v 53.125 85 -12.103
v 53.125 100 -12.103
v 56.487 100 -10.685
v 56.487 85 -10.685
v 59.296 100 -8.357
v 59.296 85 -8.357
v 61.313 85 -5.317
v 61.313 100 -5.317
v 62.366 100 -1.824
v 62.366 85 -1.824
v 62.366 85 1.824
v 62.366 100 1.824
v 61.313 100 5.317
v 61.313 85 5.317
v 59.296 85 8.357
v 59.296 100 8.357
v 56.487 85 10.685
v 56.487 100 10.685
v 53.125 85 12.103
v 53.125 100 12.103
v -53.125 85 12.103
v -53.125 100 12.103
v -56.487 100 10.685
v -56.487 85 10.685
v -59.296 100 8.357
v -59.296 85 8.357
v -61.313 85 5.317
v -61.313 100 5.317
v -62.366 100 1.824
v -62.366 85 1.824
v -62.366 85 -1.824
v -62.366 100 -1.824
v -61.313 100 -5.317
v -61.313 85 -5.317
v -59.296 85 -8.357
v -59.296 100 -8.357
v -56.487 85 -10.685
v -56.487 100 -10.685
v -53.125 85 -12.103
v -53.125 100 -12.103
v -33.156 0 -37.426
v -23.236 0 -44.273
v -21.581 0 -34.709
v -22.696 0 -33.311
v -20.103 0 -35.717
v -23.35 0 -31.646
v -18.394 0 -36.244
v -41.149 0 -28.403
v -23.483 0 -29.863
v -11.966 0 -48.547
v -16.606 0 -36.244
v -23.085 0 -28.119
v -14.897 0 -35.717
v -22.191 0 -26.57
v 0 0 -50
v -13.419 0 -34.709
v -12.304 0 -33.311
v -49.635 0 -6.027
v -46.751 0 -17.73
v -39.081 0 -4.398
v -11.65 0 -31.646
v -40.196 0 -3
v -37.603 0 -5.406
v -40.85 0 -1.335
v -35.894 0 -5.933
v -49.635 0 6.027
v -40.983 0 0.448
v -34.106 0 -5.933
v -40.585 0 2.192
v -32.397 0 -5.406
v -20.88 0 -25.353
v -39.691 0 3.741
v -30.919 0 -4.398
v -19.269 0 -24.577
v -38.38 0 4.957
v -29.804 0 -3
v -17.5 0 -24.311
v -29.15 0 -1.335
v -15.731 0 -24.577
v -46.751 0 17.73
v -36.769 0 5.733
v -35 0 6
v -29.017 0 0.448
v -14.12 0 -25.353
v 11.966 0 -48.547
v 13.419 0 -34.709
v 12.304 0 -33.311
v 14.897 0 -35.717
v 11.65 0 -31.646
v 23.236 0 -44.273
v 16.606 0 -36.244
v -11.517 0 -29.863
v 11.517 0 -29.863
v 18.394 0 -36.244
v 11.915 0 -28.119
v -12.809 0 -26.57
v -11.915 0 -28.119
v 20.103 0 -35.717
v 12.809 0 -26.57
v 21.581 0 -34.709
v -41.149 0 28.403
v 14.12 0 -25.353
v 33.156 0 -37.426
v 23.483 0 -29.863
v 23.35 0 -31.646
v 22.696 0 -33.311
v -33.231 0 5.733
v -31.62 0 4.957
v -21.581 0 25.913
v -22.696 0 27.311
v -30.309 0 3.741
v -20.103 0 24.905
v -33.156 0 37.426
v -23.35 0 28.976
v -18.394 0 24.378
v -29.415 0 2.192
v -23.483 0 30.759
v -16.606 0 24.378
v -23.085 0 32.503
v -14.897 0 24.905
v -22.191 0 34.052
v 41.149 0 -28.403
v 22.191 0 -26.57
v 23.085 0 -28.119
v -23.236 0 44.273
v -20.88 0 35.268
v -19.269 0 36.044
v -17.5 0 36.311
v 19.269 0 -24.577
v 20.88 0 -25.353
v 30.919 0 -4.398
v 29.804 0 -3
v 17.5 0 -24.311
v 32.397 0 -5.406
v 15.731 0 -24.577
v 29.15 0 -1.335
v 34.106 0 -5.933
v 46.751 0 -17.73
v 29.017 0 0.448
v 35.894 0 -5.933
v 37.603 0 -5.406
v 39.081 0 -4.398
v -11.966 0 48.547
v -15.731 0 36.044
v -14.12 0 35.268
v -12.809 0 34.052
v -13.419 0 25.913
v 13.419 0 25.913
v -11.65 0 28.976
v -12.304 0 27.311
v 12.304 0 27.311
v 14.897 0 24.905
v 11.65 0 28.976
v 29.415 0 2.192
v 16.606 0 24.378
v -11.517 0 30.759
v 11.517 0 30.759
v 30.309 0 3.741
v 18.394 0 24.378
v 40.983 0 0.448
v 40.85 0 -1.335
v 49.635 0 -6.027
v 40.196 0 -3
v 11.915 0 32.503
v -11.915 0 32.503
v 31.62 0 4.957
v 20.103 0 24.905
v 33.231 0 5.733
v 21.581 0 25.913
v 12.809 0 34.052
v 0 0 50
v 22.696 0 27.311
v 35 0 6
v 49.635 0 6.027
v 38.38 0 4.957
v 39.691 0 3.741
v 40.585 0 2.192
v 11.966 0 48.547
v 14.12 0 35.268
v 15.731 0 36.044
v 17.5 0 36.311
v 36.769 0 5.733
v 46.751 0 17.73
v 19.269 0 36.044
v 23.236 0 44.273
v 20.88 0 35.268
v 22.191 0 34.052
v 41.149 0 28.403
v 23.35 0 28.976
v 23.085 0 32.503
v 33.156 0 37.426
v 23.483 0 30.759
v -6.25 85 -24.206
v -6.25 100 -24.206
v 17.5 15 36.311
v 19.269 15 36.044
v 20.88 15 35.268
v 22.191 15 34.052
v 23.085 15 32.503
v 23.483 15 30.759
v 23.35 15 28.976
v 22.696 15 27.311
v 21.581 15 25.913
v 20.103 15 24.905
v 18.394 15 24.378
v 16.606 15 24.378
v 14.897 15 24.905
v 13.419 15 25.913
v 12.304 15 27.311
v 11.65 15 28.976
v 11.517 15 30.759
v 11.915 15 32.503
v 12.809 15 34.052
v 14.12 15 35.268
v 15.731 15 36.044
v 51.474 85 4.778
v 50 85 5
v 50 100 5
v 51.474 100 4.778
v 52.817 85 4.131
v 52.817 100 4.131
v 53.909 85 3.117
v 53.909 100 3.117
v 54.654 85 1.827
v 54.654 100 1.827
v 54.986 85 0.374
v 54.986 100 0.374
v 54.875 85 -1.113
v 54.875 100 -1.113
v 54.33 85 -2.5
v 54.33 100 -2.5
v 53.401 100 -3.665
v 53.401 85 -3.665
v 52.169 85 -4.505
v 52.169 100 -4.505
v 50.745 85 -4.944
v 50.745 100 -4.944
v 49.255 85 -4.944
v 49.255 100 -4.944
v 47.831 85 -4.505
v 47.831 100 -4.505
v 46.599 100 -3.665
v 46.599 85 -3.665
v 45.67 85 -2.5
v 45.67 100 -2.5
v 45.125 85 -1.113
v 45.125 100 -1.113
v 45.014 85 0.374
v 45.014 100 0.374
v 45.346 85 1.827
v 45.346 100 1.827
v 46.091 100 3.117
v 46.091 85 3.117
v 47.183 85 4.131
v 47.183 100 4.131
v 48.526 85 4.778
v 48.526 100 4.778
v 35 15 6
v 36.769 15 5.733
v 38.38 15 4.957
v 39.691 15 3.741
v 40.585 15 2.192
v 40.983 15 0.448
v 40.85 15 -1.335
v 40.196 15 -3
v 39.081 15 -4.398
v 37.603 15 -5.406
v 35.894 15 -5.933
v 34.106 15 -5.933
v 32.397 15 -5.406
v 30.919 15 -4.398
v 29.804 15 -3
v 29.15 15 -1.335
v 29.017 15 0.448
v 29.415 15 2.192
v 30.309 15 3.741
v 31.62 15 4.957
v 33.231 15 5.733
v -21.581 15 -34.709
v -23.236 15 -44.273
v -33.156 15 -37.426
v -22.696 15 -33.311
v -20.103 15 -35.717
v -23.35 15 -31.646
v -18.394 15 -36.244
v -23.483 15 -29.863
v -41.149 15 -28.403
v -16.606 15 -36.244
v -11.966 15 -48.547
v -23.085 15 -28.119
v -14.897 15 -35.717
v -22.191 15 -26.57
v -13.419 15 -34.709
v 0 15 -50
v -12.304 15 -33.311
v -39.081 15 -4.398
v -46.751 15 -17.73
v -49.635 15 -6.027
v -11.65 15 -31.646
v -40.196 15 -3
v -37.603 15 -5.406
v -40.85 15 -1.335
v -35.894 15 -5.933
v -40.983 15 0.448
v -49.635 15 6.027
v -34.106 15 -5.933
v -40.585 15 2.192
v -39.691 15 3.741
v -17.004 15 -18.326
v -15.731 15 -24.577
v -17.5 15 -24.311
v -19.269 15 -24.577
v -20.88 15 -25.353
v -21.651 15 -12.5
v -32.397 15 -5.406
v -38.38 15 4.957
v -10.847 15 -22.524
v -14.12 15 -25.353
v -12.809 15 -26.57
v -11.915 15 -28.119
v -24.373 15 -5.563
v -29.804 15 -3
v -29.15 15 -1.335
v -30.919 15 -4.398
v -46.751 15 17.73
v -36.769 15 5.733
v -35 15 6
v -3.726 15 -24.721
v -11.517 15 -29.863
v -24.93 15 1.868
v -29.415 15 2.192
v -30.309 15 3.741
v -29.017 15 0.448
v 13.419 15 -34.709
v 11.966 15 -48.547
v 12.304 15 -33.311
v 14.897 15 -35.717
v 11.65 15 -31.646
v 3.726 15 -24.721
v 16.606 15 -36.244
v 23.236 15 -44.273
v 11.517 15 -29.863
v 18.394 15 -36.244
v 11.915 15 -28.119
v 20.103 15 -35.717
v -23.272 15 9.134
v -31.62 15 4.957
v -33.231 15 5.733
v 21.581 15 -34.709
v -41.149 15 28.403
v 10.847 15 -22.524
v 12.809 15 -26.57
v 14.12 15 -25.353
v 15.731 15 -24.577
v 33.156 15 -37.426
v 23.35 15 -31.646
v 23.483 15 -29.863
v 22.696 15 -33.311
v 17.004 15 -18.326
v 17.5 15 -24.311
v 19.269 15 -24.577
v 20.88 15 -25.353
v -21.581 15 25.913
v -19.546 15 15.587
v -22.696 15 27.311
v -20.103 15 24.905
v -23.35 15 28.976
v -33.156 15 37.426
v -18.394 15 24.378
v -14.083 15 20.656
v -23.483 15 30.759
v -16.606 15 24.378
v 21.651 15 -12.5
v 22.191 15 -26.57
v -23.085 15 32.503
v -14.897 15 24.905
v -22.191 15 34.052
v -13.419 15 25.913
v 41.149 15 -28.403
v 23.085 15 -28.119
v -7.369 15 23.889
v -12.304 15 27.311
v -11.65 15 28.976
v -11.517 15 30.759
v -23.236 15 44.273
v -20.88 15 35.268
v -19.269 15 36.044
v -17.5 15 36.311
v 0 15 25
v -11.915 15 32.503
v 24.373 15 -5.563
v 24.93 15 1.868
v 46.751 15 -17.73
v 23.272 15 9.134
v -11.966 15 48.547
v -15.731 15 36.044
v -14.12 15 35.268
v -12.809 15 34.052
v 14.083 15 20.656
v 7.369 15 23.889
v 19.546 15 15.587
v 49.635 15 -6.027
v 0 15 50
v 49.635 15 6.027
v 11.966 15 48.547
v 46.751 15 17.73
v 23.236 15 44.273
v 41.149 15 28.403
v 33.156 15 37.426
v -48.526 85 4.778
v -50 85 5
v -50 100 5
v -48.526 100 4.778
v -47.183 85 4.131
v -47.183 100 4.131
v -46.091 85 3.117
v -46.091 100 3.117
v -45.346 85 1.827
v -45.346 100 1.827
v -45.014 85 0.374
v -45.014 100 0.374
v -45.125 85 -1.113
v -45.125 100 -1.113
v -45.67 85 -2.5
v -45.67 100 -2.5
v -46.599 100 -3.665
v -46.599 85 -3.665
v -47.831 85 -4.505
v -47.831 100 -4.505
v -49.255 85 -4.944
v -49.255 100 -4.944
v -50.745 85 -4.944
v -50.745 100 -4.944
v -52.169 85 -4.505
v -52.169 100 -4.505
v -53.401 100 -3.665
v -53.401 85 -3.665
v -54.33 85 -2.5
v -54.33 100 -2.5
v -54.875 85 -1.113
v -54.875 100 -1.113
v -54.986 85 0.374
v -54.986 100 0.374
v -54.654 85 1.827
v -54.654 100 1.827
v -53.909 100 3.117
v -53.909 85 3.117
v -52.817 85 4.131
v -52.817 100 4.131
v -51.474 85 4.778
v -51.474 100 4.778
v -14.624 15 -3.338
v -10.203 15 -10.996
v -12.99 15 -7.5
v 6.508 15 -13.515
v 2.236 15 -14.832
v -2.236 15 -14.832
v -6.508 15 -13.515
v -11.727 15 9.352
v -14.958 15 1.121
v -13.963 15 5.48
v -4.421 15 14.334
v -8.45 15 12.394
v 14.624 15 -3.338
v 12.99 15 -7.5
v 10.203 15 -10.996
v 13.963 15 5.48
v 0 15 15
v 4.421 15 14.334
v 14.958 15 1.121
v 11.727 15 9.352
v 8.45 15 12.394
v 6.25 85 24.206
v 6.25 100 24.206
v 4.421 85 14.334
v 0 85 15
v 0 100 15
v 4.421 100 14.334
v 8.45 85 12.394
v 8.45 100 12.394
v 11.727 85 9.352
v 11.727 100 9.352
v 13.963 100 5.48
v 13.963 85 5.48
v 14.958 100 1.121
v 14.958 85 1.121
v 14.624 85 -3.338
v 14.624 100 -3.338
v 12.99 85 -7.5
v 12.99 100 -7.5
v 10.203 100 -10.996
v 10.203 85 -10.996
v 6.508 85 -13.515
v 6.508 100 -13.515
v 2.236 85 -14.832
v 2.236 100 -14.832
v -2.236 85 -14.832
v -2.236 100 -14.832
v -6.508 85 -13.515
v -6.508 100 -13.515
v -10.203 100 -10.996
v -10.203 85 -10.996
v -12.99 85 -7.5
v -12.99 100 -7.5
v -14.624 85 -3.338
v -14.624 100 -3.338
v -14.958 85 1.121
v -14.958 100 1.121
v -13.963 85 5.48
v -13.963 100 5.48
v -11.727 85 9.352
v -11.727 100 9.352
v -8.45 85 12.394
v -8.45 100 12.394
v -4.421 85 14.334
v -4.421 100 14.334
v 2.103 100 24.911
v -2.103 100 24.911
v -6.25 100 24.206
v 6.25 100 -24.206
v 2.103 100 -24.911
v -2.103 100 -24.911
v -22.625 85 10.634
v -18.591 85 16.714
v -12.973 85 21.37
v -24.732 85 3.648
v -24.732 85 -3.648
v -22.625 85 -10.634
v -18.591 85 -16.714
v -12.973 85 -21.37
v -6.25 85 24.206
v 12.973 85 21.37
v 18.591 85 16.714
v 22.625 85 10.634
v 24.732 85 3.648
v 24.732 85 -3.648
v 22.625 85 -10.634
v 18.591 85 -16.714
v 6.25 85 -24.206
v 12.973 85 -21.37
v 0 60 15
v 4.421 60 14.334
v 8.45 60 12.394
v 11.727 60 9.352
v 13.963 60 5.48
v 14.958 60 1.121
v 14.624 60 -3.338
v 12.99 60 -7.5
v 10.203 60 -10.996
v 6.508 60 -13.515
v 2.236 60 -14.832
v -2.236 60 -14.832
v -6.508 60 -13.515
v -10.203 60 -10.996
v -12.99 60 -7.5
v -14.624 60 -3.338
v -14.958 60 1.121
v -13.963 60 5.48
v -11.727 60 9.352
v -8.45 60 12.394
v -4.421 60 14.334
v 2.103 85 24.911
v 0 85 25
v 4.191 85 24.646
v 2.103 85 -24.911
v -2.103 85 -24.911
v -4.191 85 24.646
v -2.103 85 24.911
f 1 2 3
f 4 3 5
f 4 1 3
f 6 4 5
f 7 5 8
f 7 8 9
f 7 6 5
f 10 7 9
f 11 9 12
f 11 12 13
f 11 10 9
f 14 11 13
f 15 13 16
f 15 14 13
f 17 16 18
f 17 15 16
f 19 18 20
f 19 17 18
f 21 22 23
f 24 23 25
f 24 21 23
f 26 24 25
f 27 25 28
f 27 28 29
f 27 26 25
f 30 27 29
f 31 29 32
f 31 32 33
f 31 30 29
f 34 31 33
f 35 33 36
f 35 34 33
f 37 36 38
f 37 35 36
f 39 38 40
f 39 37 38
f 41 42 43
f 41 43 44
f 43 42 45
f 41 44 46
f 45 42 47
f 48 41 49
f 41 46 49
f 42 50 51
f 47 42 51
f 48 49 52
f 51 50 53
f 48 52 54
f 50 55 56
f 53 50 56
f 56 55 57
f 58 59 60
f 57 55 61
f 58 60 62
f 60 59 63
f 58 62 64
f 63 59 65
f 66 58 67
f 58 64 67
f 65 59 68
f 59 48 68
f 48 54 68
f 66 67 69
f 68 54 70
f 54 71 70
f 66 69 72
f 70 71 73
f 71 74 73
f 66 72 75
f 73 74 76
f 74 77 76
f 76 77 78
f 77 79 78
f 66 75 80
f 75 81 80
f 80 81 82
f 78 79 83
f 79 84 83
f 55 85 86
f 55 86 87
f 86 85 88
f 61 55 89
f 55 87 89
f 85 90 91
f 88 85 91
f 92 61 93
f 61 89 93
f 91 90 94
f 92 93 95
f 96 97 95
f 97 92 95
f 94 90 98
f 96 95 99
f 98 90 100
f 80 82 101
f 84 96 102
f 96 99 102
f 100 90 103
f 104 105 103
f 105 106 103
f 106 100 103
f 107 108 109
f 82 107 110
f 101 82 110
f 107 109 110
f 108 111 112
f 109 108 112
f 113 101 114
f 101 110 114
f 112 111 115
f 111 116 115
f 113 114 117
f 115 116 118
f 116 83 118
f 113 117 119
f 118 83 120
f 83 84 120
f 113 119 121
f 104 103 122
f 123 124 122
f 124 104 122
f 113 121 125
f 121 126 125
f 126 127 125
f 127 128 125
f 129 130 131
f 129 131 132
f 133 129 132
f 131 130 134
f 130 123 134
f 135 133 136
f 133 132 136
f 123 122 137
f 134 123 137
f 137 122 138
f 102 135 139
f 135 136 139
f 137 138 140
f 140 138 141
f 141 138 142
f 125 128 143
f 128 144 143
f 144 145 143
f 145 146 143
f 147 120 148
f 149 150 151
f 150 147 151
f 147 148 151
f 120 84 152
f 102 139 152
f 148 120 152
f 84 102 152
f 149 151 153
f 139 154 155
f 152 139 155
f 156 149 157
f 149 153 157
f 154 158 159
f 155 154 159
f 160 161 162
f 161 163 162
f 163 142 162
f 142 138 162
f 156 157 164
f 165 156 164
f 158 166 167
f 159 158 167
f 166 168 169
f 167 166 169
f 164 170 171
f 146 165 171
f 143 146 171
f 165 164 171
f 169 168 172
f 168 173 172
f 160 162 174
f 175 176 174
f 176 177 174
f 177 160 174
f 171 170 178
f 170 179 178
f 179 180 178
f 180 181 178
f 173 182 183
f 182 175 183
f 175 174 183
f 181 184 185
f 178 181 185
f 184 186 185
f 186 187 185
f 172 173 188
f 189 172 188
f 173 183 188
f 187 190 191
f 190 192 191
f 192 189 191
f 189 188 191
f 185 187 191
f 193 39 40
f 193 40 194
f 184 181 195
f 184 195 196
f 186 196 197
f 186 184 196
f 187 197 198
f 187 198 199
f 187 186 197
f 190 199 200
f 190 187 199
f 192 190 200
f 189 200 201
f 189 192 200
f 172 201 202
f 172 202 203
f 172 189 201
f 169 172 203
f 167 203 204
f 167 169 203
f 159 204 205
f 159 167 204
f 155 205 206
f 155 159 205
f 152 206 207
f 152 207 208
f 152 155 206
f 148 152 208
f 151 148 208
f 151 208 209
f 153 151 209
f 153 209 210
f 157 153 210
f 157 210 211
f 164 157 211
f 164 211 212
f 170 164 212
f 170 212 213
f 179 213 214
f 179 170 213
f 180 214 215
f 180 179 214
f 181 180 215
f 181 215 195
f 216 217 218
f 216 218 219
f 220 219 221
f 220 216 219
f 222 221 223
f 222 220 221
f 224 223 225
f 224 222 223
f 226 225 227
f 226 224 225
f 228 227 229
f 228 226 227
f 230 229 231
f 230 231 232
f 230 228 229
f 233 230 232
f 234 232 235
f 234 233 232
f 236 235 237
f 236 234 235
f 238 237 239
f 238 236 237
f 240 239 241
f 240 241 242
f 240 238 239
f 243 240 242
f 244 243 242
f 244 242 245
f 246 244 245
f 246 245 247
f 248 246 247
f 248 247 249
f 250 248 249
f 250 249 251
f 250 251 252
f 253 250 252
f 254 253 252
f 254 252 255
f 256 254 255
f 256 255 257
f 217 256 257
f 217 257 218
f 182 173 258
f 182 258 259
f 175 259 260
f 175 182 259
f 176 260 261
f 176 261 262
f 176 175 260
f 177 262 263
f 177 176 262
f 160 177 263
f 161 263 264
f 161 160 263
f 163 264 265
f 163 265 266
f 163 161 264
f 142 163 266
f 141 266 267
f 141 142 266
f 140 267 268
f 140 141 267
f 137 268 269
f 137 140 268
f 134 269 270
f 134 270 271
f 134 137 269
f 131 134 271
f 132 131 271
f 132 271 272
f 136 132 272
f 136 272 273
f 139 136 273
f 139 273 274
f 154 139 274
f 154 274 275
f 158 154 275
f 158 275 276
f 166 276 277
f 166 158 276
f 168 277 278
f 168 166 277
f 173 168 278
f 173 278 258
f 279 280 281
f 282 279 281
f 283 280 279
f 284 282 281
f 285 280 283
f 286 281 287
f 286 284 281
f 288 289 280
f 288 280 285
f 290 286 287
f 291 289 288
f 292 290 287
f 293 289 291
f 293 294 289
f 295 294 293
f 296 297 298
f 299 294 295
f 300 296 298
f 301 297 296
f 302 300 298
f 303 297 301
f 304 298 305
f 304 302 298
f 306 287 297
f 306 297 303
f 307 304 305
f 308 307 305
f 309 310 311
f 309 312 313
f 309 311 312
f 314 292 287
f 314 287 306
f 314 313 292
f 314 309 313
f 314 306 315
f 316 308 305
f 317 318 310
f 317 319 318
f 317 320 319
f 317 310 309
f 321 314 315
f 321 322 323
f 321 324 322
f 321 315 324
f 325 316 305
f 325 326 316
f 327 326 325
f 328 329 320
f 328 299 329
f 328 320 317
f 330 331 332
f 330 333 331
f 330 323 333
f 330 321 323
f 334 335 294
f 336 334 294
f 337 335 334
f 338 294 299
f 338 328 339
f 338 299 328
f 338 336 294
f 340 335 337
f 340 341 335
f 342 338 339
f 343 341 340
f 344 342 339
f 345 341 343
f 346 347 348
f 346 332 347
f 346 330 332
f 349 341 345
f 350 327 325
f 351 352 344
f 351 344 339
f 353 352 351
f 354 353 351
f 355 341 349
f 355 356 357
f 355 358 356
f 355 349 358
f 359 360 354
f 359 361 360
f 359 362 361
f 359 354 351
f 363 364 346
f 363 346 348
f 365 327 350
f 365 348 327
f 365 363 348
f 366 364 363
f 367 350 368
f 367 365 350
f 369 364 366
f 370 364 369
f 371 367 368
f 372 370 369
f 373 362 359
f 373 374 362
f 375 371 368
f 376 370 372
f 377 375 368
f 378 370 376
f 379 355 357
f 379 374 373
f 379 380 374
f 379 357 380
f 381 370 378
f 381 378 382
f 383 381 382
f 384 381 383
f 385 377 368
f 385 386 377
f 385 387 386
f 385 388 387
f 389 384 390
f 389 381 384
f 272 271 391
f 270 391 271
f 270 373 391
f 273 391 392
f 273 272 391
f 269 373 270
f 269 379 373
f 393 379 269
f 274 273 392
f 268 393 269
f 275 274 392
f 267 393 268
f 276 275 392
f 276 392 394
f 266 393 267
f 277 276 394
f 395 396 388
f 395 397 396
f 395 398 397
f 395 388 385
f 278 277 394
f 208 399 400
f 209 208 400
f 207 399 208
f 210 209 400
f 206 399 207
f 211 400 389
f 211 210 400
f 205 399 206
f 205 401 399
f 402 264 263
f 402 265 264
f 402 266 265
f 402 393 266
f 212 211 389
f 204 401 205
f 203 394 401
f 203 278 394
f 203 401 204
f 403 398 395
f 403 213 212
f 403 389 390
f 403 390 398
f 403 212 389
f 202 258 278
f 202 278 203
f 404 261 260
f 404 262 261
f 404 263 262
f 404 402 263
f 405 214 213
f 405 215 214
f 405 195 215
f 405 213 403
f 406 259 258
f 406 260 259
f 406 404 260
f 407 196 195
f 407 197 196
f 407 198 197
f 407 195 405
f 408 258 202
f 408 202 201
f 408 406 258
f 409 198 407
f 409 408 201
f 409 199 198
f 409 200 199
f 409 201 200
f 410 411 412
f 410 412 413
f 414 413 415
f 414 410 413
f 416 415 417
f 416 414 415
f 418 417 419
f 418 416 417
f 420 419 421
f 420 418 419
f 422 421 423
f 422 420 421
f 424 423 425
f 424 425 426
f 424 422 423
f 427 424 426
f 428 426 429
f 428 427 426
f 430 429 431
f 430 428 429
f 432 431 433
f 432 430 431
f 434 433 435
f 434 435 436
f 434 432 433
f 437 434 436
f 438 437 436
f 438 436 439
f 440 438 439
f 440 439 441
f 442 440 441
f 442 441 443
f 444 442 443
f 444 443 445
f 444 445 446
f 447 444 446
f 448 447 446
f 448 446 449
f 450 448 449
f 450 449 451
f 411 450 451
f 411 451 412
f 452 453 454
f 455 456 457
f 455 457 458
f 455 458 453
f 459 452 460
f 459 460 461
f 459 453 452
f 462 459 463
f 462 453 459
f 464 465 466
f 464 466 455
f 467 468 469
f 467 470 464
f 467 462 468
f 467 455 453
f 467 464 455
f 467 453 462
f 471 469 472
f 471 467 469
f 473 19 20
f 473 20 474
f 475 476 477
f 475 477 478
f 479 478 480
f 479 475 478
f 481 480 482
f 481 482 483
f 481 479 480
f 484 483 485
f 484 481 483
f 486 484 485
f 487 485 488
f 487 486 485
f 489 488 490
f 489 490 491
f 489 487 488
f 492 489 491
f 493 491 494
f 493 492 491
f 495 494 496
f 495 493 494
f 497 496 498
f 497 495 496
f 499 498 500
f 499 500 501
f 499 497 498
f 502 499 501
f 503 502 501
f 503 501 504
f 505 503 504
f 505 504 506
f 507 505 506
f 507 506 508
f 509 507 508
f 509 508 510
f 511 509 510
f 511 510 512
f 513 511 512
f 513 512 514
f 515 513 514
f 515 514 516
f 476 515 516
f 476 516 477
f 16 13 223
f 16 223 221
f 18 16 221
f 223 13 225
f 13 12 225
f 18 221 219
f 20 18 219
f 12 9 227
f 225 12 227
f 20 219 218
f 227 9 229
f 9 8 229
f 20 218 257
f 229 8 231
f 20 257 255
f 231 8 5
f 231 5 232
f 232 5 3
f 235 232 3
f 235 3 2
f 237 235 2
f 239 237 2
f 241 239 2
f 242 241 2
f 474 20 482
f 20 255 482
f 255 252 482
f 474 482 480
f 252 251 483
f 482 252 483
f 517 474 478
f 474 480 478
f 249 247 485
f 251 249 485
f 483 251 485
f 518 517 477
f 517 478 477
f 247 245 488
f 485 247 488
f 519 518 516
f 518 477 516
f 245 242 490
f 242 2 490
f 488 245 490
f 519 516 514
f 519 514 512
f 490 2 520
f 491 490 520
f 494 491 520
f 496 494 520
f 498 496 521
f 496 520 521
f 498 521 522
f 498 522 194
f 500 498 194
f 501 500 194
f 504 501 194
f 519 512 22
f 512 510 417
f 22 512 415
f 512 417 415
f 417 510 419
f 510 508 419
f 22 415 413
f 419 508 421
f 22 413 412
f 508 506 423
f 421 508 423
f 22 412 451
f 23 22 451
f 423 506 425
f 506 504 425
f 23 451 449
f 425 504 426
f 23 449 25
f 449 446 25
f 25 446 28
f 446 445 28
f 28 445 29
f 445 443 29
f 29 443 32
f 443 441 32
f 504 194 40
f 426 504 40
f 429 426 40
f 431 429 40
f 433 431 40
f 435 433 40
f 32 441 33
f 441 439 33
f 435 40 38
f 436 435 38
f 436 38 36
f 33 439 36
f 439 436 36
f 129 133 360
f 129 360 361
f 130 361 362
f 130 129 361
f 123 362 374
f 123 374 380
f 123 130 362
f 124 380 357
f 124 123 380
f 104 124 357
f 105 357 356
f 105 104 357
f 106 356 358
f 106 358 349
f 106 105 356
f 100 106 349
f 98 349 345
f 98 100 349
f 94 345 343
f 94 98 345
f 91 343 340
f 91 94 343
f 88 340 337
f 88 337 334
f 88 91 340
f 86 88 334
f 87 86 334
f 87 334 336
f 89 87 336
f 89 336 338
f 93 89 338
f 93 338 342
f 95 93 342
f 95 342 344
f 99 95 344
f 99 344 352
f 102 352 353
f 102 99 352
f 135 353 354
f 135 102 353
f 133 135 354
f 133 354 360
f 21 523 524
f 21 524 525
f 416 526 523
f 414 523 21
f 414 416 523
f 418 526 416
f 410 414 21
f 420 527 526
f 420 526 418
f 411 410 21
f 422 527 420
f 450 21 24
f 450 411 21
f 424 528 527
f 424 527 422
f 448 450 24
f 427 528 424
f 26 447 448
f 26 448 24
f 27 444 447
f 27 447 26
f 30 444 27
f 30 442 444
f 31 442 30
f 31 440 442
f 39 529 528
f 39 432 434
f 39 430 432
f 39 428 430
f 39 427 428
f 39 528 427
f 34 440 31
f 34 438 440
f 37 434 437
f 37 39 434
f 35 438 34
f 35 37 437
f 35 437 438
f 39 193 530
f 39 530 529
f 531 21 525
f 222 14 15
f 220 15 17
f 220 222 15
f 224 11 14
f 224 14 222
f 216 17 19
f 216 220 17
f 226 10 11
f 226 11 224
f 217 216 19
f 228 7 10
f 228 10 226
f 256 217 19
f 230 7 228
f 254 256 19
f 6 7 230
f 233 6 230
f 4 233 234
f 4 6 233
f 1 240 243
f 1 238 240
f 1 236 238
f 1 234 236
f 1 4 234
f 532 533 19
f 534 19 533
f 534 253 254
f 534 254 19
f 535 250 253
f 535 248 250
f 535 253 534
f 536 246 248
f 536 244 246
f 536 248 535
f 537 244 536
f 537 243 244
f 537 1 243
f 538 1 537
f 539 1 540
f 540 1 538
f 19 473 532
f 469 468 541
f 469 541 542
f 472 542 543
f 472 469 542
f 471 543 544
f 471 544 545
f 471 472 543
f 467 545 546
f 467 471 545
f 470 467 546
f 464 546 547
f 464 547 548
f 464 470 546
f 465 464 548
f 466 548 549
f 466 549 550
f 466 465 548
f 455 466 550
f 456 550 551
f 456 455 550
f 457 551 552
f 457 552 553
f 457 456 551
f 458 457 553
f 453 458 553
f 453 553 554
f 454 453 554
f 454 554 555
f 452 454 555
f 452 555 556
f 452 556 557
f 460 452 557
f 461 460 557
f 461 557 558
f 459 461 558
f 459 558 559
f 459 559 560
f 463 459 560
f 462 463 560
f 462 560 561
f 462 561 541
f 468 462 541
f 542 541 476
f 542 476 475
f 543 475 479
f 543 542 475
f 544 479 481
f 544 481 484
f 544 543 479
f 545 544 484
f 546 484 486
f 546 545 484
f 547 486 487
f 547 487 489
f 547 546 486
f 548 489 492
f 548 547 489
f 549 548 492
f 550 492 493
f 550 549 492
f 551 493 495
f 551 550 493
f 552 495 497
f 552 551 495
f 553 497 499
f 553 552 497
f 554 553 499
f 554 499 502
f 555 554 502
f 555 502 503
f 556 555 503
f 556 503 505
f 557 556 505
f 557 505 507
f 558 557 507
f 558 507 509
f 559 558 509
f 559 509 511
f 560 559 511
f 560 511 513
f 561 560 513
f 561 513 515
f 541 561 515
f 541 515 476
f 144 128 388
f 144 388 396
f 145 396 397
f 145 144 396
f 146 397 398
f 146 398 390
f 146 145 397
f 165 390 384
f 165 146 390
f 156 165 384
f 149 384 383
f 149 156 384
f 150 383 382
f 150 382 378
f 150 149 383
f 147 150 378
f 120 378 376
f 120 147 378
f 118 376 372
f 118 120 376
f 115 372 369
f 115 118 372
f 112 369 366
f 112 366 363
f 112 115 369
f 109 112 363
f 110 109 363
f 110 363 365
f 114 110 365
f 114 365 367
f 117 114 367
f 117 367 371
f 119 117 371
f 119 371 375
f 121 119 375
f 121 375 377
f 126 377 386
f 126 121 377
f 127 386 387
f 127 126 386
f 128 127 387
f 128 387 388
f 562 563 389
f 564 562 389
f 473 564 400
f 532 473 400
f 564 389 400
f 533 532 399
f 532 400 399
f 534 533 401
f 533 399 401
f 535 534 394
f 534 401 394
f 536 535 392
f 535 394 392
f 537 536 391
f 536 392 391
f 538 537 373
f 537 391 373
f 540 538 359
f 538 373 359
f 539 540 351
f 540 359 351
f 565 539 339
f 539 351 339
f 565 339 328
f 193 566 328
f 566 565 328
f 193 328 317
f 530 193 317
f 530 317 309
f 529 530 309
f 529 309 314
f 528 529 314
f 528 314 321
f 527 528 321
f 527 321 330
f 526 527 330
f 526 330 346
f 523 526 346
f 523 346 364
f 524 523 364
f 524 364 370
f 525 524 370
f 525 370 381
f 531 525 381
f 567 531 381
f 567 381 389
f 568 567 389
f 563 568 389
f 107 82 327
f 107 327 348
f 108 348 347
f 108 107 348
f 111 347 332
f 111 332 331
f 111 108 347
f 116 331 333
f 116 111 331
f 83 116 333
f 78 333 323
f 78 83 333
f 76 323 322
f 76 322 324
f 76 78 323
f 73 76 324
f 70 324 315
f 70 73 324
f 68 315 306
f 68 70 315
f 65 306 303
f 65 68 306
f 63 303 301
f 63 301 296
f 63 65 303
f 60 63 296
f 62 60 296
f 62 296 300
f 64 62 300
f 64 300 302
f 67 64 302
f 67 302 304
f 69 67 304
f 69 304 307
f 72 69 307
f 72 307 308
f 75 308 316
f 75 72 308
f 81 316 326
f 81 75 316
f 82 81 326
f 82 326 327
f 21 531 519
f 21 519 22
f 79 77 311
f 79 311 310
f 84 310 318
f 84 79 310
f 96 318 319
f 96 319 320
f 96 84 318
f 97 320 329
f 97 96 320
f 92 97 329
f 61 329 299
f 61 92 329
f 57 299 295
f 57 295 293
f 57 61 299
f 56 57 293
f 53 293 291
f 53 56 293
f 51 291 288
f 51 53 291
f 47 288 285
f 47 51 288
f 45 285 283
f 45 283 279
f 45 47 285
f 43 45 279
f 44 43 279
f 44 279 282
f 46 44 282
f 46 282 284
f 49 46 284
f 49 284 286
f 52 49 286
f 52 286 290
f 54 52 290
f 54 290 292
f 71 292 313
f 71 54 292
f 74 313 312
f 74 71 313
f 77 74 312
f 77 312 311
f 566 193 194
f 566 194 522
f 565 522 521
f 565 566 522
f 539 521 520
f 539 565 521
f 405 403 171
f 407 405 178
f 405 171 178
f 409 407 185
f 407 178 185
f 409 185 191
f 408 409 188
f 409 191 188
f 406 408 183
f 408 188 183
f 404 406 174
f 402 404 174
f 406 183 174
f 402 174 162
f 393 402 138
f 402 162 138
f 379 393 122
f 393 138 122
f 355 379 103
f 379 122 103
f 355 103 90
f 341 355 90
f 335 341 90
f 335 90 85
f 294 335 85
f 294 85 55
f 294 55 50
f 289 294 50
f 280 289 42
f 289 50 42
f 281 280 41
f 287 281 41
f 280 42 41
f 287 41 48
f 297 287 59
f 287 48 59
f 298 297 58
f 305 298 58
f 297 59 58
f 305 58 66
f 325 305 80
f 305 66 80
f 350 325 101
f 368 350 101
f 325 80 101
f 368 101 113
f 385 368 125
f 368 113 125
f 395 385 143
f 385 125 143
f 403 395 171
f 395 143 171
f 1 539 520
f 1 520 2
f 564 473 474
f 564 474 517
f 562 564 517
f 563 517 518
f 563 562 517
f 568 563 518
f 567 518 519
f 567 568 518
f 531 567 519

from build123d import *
from build123d.topology import SkipClean

# Parameters (mm, degrees)
SKETCH1_R           = 50
SKETCH1_R_2         = 6
BOSS_EXTRUDE1_DEPTH = 15
SKETCH2_R           = 25
SKETCH2_R_2         = 15
BOSS_EXTRUDE2_DEPTH = 70
BOSS_EXTRUDE3_DEPTH = 15
CUT_EXTRUDE1_START  = -40
SKETCH4_R           = 15
SKETCH4_R_2         = 5
CUT_EXTRUDE1_DEPTH  = 40


with BuildPart() as part:
    # Sketch1 → Boss-Extrude1 (new body)
    with BuildSketch(Plane(origin=(0, 0, 0), x_dir=(1, 0, 0), z_dir=(0, 1, 0))):
        with Locations(Location((0, 0, 0), (0, 0, 270))):
            Circle(SKETCH1_R)
        with Locations(Location((-35, 0, 0), (0, 0, 270))):
            Circle(SKETCH1_R_2, mode=Mode.SUBTRACT)
        with Locations(Location((-17.5, 30.310889132, 0), (0, 0, 270))):
            Circle(SKETCH1_R_2, mode=Mode.SUBTRACT)
        with Locations(Location((17.5, 30.310889132, 0), (0, 0, 270))):
            Circle(SKETCH1_R_2, mode=Mode.SUBTRACT)
        with Locations(Location((35, 0, 0), (0, 0, 270))):
            Circle(SKETCH1_R_2, mode=Mode.SUBTRACT)
        with Locations(Location((17.5, -30.310889132, 0), (0, 0, 270))):
            Circle(SKETCH1_R_2, mode=Mode.SUBTRACT)
        with Locations(Location((-17.5, -30.310889132, 0), (0, 0, 270))):
            Circle(SKETCH1_R_2, mode=Mode.SUBTRACT)
    extrude(amount=BOSS_EXTRUDE1_DEPTH)

    # Sketch2 → Boss-Extrude2 (add)
    with BuildSketch(Plane(origin=(0, 15, 0), x_dir=(1, 0, 0), z_dir=(0, 1, 0))):
        with Locations(Location((0, 0, 0), (0, 0, 270))):
            Circle(SKETCH2_R)
        with Locations(Location((0, 0, 0), (0, 0, 270))):
            Circle(SKETCH2_R_2, mode=Mode.SUBTRACT)
    extrude(amount=BOSS_EXTRUDE2_DEPTH)

    # Sketch3 → Boss-Extrude3 (add)
    with SkipClean():  # the faces are left unmerged after this step: merging them gives an invalid solid
        with BuildSketch(Plane(origin=(0, 85, 0), x_dir=(1, 0, 0), z_dir=(0, 1, 0))):
            with BuildLine():
                Line((-53.125, 12.103072957), (-6.25, 24.206145914))
                ThreePointArc((-6.25, 24.206145914), (0, 25), (6.25, 24.206145914))
                Line((6.25, 24.206145914), (53.125, 12.103072957))
                ThreePointArc((53.125, 12.103072957), (62.5, 0), (53.125, -12.103072957))
                Line((53.125, -12.103072957), (6.25, -24.206145914))
                ThreePointArc((6.25, -24.206145914), (0, -25), (-6.25, -24.206145914))
                Line((-6.25, -24.206145914), (-53.125, -12.103072957))
                ThreePointArc((-53.125, -12.103072957), (-62.5, 0), (-53.125, 12.103072957))
            make_face()
        extrude(amount=BOSS_EXTRUDE3_DEPTH)

    # Sketch4 → Cut-Extrude1 (cut)
    with SkipClean():  # the faces are left unmerged after this step: merging them gives an invalid solid
        with BuildSketch(Plane(origin=(0, 100, 0), x_dir=(1, 0, 0), z_dir=(0, 1, 0)).offset(CUT_EXTRUDE1_START)):
            with Locations(Location((0, 0, 0), (0, 0, 270))):
                Circle(SKETCH4_R)
            with Locations(Location((-50, 0, 0), (0, 0, 270))):
                Circle(SKETCH4_R_2)
            with Locations(Location((50, 0, 0), (0, 0, 270))):
                Circle(SKETCH4_R_2)
        extrude(amount=CUT_EXTRUDE1_DEPTH, mode=Mode.SUBTRACT)


solid = part.part
